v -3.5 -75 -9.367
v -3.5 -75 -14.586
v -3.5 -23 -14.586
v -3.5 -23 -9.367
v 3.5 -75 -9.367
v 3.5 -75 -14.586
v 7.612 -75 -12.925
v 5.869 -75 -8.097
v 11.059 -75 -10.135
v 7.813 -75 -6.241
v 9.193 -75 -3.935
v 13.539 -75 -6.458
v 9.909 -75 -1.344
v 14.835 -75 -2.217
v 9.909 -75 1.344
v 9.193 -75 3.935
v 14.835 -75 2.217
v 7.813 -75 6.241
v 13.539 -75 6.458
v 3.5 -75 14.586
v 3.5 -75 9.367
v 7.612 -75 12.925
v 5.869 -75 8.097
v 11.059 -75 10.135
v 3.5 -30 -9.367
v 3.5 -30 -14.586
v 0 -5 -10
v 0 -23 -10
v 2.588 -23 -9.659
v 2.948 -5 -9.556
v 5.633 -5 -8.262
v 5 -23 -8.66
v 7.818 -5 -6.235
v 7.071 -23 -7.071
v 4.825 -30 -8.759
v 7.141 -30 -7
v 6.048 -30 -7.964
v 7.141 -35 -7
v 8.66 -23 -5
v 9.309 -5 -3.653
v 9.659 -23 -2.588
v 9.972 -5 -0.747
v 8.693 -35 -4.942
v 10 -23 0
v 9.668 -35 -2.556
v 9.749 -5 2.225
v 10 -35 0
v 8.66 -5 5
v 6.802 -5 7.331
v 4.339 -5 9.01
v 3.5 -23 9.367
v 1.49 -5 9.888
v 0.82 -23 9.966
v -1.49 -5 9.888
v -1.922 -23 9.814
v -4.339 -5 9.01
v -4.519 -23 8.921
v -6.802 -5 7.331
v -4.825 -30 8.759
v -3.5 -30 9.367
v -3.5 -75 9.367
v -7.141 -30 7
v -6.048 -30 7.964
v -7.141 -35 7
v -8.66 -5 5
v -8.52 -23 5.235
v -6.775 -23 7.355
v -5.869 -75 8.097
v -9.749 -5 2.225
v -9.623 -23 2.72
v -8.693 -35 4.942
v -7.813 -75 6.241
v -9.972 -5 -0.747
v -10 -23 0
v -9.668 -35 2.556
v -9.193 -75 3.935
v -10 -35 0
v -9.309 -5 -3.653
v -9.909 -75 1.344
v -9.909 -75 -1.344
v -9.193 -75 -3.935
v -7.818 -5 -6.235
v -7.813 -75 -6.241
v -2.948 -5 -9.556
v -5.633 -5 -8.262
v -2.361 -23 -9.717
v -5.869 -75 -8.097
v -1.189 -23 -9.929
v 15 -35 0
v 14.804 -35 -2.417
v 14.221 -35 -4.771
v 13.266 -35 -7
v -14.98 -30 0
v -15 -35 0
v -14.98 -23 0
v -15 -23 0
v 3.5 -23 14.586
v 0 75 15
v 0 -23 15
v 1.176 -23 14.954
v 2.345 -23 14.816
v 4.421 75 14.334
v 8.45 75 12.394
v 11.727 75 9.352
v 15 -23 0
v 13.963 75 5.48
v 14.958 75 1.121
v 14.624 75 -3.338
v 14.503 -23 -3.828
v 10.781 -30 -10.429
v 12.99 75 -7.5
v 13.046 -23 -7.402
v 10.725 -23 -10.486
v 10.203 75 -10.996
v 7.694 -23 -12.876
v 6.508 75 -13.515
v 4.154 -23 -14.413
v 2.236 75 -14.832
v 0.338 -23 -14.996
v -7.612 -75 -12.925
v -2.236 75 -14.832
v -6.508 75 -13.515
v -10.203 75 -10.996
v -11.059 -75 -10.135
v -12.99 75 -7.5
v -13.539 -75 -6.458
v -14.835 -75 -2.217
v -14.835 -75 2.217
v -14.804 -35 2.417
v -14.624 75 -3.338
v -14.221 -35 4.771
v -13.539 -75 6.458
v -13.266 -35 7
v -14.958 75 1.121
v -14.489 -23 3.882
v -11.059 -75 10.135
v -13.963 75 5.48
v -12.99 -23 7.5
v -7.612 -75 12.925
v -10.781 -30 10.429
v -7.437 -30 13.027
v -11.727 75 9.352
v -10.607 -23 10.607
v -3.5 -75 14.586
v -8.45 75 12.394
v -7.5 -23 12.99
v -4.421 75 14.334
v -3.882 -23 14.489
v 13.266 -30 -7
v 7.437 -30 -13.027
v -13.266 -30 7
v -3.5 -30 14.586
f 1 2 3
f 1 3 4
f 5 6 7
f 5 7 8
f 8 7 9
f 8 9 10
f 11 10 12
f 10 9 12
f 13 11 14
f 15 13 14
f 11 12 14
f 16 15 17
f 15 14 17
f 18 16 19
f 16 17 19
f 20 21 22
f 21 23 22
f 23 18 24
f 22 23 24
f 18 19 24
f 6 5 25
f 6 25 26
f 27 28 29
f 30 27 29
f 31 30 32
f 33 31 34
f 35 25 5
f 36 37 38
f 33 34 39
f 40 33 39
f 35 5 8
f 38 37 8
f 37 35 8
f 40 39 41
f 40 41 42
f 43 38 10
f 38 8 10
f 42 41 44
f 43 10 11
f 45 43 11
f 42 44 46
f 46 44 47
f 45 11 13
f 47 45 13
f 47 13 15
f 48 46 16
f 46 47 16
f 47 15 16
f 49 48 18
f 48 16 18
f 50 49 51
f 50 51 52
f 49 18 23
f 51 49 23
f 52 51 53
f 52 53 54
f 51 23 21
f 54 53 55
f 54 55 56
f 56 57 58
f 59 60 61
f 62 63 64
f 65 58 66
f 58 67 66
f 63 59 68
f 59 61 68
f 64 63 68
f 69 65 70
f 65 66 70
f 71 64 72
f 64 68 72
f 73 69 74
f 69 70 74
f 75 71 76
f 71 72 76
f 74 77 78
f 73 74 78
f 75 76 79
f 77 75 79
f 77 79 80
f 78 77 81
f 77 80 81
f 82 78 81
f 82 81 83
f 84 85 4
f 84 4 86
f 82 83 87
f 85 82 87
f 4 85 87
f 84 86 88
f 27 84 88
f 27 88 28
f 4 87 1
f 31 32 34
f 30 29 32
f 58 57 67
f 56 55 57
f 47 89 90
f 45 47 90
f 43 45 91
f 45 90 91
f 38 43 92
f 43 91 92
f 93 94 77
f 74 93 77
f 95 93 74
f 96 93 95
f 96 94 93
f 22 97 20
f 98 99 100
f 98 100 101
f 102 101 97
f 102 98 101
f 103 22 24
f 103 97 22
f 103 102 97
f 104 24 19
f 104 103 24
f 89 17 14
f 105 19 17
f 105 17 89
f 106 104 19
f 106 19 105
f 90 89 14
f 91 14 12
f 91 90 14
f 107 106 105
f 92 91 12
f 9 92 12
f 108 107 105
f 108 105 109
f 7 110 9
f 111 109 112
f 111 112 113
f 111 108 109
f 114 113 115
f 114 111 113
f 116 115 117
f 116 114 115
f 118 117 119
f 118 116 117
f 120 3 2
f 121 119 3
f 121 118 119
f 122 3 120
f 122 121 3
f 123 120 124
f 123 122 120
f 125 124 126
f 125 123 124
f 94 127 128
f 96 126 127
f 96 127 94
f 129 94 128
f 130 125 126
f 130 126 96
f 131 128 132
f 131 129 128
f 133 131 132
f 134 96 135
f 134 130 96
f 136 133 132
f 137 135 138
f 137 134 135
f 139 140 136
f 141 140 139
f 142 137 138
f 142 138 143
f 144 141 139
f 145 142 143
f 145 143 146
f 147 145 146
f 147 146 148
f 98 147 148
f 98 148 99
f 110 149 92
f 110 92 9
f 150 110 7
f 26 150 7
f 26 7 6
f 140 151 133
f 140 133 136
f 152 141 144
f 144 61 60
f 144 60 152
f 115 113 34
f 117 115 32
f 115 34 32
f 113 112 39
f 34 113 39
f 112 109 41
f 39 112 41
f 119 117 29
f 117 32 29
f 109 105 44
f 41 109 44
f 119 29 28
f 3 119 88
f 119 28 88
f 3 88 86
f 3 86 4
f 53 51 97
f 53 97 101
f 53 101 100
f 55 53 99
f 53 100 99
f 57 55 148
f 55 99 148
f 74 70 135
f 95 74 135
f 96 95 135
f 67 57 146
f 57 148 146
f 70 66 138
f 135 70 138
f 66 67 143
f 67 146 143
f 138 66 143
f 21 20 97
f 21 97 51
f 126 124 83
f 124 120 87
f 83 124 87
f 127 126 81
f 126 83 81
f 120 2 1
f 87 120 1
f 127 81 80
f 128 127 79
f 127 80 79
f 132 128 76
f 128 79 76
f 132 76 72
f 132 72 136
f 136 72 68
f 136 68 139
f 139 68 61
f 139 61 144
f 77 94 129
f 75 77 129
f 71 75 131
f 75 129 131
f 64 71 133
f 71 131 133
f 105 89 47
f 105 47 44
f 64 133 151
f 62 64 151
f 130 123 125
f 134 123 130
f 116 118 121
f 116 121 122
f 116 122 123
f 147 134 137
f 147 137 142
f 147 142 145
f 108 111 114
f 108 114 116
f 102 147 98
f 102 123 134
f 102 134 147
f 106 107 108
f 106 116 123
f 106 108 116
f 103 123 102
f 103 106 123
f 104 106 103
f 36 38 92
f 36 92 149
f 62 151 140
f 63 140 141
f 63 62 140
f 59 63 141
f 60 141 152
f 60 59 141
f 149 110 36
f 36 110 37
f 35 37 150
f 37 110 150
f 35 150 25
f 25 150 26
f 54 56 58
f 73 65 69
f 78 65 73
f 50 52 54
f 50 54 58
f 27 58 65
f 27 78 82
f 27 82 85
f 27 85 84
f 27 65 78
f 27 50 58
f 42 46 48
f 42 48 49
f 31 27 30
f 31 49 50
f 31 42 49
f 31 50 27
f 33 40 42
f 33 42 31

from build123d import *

# Parameters (mm, degrees)
SKETCH1_R           = 15
BOSS_EXTRUDE1_DEPTH = 75
CUT_EXTRUDE1_DEPTH  = 52
CUT_EXTRUDE2_DEPTH  = 3.5
SKETCH9_R           = 10
CUT_EXTRUDE12_DEPTH = 70
SKETCH17_W          = 7
SKETCH17_H          = 12
CUT_EXTRUDE19_DEPTH = 15
SKETCH19_W          = 7
SKETCH19_H          = 12
CUT_EXTRUDE20_DEPTH = 15


with BuildPart() as part:
    # Sketch1 → Boss-Extrude1 (new, symmetric)
    with BuildSketch(Plane(origin=(0, 0, 0), x_dir=(1, 0, 0), z_dir=(0, 1, 0))):
        with Locations(Location((0, 0, 0), (0, 0, 270))):
            Circle(SKETCH1_R)
    extrude(amount=BOSS_EXTRUDE1_DEPTH, both=True)

    # Sketch2 → Cut-Extrude1 (cut)
    with BuildSketch(Plane.XZ.offset(75)):
        with BuildLine():
            Line((3.5, 15), (3.5, -15))
            ThreePointArc((3.5, -15), (0, -18.5), (-3.5, -15))
            Line((-3.5, -15), (-3.5, 15))
            ThreePointArc((-3.5, 15), (0, 18.5), (3.5, 15))
        make_face()
    extrude(amount=-CUT_EXTRUDE1_DEPTH, mode=Mode.SUBTRACT)

    # Sketch3 → Cut-Extrude2 (cut, symmetric)
    with BuildSketch(Plane(origin=(0, -26.5, 0), x_dir=(1, 0, 0), z_dir=(0, 1, 0))):
        Polygon((-14.980069936, 0), (-15.328117643, -9.993941304), (-0.348047707, -16.993941304), (0, -7), align=None)
        Polygon((15, 0), (0, 7), (0.348047707, 16.993941304), (15.348047707, 9.993941304), align=None)
    extrude(amount=CUT_EXTRUDE2_DEPTH, both=True, mode=Mode.SUBTRACT)

    # Sketch9 → Cut-Extrude12 (cut)
    with BuildSketch(Plane.XZ.offset(75)):
        with Locations(Location((0, 0, 0), (0, 0, 270))):
            Circle(SKETCH9_R)
    extrude(amount=-CUT_EXTRUDE12_DEPTH, mode=Mode.SUBTRACT)

    # Sketch17 → Cut-Extrude19 (cut)
    with BuildSketch(Plane(origin=(15, 0, 0), x_dir=(0, 0, -1), z_dir=(1, 0, 0))):
        with Locations((3.5, -29)):
            Rectangle(SKETCH17_W, SKETCH17_H)
    extrude(amount=-CUT_EXTRUDE19_DEPTH, mode=Mode.SUBTRACT)

    # Sketch19 → Cut-Extrude20 (cut)
    with BuildSketch(Plane.ZY.offset(15)):
        with Locations((3.5, -29)):
            Rectangle(SKETCH19_W, SKETCH19_H)
    extrude(amount=-CUT_EXTRUDE20_DEPTH, mode=Mode.SUBTRACT)


solid = part.part
